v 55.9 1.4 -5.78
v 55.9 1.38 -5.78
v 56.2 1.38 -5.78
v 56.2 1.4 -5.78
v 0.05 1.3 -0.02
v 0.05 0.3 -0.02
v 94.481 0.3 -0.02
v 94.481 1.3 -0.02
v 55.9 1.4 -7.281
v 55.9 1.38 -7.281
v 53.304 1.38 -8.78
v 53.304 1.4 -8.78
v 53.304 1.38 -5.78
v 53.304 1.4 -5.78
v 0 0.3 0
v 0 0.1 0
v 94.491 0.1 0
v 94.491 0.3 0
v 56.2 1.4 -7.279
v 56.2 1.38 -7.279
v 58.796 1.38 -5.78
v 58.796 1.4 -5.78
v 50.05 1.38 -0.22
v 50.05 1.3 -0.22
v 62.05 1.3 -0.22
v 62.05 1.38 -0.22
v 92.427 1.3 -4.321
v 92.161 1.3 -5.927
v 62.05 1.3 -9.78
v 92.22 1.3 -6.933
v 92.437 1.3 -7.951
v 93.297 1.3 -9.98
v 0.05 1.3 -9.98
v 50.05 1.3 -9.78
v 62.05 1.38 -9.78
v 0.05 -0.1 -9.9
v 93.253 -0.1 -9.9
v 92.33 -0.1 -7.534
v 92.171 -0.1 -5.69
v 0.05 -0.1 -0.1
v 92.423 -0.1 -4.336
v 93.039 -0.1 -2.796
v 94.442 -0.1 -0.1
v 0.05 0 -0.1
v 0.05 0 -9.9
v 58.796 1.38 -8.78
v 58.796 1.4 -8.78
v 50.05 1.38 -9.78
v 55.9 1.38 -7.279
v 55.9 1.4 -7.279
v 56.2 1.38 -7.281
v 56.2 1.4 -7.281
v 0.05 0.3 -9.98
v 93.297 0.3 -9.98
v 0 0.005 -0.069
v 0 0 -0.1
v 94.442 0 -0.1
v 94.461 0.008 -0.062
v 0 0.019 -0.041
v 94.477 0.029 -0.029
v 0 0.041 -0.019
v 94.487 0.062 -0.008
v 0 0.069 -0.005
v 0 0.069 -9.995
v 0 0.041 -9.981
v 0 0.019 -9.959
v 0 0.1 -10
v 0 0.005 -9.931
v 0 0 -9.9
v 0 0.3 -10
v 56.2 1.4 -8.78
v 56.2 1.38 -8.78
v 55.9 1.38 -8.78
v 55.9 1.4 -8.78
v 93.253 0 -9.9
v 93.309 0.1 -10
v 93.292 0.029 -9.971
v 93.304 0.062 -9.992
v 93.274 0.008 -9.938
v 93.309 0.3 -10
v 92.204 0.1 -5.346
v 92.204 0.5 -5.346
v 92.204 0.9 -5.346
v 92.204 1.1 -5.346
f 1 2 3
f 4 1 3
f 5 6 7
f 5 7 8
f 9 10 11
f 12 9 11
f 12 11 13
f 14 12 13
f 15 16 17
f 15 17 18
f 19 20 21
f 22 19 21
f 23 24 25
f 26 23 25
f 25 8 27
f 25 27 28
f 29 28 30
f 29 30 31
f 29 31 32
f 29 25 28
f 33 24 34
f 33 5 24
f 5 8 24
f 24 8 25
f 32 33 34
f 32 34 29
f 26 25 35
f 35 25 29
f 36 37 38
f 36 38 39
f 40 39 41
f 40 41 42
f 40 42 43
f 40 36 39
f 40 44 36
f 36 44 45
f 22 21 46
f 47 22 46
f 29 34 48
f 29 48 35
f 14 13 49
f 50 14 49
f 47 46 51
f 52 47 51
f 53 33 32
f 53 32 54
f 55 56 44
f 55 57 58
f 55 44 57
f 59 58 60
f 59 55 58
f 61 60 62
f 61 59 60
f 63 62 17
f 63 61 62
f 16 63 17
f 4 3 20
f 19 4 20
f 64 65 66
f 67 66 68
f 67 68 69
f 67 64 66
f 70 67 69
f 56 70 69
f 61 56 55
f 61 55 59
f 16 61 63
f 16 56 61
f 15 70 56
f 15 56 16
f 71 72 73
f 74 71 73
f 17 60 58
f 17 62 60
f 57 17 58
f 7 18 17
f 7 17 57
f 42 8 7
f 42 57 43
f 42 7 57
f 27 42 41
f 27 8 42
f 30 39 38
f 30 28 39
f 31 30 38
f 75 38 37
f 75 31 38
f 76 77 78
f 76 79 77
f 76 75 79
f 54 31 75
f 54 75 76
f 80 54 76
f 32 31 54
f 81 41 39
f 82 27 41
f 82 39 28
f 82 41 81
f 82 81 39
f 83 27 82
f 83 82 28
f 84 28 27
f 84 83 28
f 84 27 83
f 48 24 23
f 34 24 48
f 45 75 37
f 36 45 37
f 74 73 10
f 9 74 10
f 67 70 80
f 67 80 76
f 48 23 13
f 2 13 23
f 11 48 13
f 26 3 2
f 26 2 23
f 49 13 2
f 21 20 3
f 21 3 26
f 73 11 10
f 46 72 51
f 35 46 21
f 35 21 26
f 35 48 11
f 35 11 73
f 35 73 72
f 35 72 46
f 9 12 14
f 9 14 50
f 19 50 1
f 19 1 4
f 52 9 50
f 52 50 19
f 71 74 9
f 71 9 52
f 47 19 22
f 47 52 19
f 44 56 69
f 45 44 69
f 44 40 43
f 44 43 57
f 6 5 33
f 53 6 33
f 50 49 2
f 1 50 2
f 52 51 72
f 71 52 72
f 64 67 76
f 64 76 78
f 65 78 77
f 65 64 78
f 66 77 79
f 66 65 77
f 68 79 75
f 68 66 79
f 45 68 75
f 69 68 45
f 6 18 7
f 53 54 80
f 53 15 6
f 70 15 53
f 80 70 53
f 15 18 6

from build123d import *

# Parameters (mm, degrees)
EXTRUDE1_DEPTH = 100
SKETCH2_W      = 9.96
SKETCH2_H      = 1
SKETCH2_W_2    = 9.8
SKETCH2_H_2    = 0.1
EXTRUDE2_DEPTH = 0.05
EXTRUDE3_DEPTH = 2
SKETCH4_W      = 12
SKETCH4_H      = 9.559999993
EXTRUDE4_DEPTH = 0.08
EXTRUDE5_DEPTH = 0.02


with BuildPart() as part:
    # Sketch1 → Extrude1 (new body)
    with BuildSketch(Plane(origin=(0, 0, 0), x_dir=(0, 0, -1), z_dir=(1, 0, 0))):
        with BuildLine():
            Line((9.98, 0.3), (10, 0.3))
            Line((10, 0.3), (10, 0.1))
            ThreePointArc((10, 0.1), (9.970710678, 0.029289322), (9.9, 0))
            Line((9.9, 0), (9.9, -0.1))
            Line((9.9, -0.1), (0.1, -0.1))
            Line((0.1, -0.1), (0.1, 0))
            ThreePointArc((0.1, 0), (0.029289322, 0.029289322), (0, 0.1))
            Line((0, 0.1), (0, 0.3))
            Line((0, 0.3), (0.02, 0.3))
            Line((0.02, 0.3), (0.02, 1.3))
            Line((0.02, 1.3), (9.98, 1.3))
            Line((9.98, 1.3), (9.98, 0.3))
        make_face()
    extrude(amount=EXTRUDE1_DEPTH)

    # Sketch2 → Extrude2 (cut)
    with BuildSketch(Plane(origin=(0, 0, 0), x_dir=(0, 0, -1), z_dir=(1, 0, 0))):
        with Locations((5, 0.8)):
            Rectangle(SKETCH2_W, SKETCH2_H)
        with Locations((5, -0.05)):
            Rectangle(SKETCH2_W_2, SKETCH2_H_2)
    extrude(amount=EXTRUDE2_DEPTH, mode=Mode.SUBTRACT)

    # Sketch3 → Extrude3 (cut)
    with BuildSketch(Plane(origin=(0, 1.3, 0), x_dir=(1, 0, 0), z_dir=(0, 1, 0))):
        with BuildLine():
            add(Edge.make_bspline(
                [(106.958570584, 17.182100949), (111.37058159, 16.276136115), (117.385402068, 8.882986689), (109.774353113, -0.100316481), (120.943228088, -13.427718663), (86.89741128, -25.636712544), (98.859416736, -3.790829743), (87.550468543, 7.821814957), (100.083371056, 18.593858308), (106.958570584, 17.182100949)],
                knots=[0, 0, 0, 0, 0.128972817, 0.210070442, 0.3169221, 0.544532993, 0.707848036, 0.799022747, 1, 1, 1, 1], degree=3))
        make_face()
    extrude(amount=-EXTRUDE3_DEPTH, mode=Mode.SUBTRACT)

    # Sketch4 → Extrude4 (add)
    with BuildSketch(Plane(origin=(0, 1.3, 0), x_dir=(1, 0, 0), z_dir=(0, 1, 0))):
        with Locations((56.05, 5.000000004)):
            Rectangle(SKETCH4_W, SKETCH4_H)
    extrude(amount=EXTRUDE4_DEPTH)

    # Sketch5 → Extrude5 (add)
    with BuildSketch(Plane(origin=(0, 1.38, 0), x_dir=(1, 0, 0), z_dir=(0, 1, 0))):
        Polygon((55.9, 7.281184034), (53.303974596, 8.78), (53.303974596, 5.78), (55.9, 7.278815966), (55.9, 5.78), (56.2, 5.78), (56.2, 7.278815966), (58.796025404, 5.78), (58.796025404, 8.78), (56.2, 7.281184034), (56.2, 8.78), (55.9, 8.78), align=None)
    extrude(amount=EXTRUDE5_DEPTH)


solid = part.part
